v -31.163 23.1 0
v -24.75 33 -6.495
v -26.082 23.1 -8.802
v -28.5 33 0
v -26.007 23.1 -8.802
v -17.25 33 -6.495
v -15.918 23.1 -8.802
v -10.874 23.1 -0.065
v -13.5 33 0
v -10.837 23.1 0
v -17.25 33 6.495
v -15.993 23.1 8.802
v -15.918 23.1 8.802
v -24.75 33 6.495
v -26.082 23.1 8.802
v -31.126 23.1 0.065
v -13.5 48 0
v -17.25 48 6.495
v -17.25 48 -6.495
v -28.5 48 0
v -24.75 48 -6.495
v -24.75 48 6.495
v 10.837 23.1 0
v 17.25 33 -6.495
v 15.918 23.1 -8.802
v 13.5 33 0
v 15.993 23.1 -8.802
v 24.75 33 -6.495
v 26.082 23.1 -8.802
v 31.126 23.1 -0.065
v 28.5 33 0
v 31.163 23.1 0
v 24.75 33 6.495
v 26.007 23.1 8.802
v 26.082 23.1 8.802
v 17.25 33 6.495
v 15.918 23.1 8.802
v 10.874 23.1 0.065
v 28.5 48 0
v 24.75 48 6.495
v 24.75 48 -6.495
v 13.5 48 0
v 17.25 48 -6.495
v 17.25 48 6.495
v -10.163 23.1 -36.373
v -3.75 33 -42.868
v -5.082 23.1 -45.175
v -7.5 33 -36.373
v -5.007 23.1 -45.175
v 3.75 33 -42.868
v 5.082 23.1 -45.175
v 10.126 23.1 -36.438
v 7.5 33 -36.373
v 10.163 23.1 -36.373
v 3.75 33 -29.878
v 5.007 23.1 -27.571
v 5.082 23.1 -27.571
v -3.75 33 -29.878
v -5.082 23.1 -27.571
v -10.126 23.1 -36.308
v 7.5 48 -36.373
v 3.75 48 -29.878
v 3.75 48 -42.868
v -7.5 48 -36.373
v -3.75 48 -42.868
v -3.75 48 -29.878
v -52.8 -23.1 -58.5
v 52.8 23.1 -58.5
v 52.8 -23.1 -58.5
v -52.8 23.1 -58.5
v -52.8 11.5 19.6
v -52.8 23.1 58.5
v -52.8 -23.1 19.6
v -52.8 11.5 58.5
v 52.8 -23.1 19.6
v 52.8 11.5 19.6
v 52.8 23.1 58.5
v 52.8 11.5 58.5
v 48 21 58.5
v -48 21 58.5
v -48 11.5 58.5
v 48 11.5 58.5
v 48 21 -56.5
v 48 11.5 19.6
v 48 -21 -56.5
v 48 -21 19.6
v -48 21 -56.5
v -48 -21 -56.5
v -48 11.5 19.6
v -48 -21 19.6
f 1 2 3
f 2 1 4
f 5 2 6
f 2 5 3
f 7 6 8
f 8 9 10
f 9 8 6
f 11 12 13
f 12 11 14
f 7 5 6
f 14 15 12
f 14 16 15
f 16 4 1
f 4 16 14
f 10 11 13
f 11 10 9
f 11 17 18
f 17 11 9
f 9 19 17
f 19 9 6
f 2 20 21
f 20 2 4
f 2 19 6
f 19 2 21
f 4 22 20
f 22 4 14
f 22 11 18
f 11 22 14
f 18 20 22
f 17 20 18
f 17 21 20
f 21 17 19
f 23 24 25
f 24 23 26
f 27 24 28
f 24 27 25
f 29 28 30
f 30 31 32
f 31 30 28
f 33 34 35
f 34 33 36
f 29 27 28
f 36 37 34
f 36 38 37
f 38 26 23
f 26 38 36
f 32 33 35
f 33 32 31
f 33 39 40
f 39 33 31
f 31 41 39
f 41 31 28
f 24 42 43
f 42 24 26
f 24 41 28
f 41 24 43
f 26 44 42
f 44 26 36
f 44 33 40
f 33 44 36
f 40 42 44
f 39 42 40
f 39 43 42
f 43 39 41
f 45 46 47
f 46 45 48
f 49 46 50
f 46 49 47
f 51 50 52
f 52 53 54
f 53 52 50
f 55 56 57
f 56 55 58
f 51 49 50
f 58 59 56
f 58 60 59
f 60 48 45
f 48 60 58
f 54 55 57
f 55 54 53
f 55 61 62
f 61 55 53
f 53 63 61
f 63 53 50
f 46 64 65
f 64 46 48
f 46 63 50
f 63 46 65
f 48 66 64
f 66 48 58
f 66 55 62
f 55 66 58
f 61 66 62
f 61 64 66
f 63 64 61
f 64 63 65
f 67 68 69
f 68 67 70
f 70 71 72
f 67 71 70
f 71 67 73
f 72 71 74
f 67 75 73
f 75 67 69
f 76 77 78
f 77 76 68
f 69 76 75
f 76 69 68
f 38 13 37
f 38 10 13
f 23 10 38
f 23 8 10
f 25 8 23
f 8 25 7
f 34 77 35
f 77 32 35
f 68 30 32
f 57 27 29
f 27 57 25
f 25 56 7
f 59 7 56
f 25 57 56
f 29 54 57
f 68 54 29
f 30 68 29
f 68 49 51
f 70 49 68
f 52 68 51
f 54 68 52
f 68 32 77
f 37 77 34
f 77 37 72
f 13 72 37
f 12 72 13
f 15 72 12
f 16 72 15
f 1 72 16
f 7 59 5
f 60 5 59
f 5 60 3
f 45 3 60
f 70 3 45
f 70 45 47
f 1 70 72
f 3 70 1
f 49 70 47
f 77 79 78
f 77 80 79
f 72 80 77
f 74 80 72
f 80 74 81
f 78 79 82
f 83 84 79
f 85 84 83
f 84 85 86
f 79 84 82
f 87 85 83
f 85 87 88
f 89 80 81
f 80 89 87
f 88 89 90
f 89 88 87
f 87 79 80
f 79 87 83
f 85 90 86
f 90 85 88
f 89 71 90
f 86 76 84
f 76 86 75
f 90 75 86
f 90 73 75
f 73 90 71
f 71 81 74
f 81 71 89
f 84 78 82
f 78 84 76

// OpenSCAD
// file: common.scad
module insert_empty() {
    translate([-56.25, -123.8, 0]) import("insert-empty.stl");
}

module insert_m4() {
    translate([-138.9, -118.225, 0]) import("insert-m4.stl");
}

module hsw_cell() {
    rotate([0, 0, 360/12]) difference() {
        // outer shell
        cylinder(r=14, h=8, center=true, $fn=6);
        // inner (thick) shell
        cylinder(r=12, h=9, center=true, $fn=6);
        // inner (thin) shell
        translate([0, 0, 2]) cylinder(r=13, h=3, $fn=6);
    }
}

function trapezoid_overhang_size(small_edge_size, height, angle) =  small_edge_size + height*tan(90-angle);

function hex_side_len(radius) = 2*radius*sin(30);

// half of the height of the largest square inscribed in a hexagon: offset from radius to edge (not vertex)
function hex_height(radius) = radius*sin(60);

function hsw_cell_offset(row, col, radius=14, gapx=0, gapy=0) = [
    ((row % 2 == 0) ? 0:hex_height(radius) + gapx/2) + (col * (2*hex_height(radius) + gapx)),
    row*((3/2)*radius + gapy),
    0
];

module hsw_tesselate(rows, cols) {
    for(i = [0:2*rows-1], j = [0:cols-1]) {
        // two radii
        translate(hsw_cell_offset(i, j)) hsw_cell();
    }
}

module rounded_inner(radius=0.25, $fn=25) {
    minkowski() {
        translate([radius, radius, radius]) sphere(r=radius);
        children();
    }
}
// from openscad tips and tricks
module bbox() { 

    // a 3D approx. of the children projection on X axis 
    module xProjection() 
        translate([0,1/2,-1/2]) 
            linear_extrude(1) 
                hull() 
                    projection() 
                        rotate([90,0,0]) 
                            linear_extrude(1) 
                                projection() children(); 
  
    // a bounding box with an offset of 1 in all axis
    module bbx()  
        minkowski() { 
            xProjection() children(); // x axis
            rotate(-90)               // y axis
                xProjection() rotate(90) children(); 
            rotate([0,-90,0])         // z axis
                xProjection() rotate([0,90,0]) children(); 
        } 
    
    // offset children() (a cube) by -1 in all axis
    module shrink()
      intersection() {
        translate([ 1, 1, 1]) children();
        translate([-1,-1,-1]) children();
      }

   shrink() bbx() children(); 
}

module test_tesselate() {
translate([-54.75, -73.2, 0]) import("/home/andy/Downloads/wall-honeycomb-224x190size(mk3s).stl");
radius = 13.5;
gapx = 0.2;
gapy = 0.2;
rows = 10;
cols = 9;
for(i = [0:rows-1], j = [0:cols-1]) {
    translate(hsw_cell_offset(i, j, radius=radius, gapx=gapx, gapy=gapy)) rotate([0, 0, 30]) {text(str(i*rows + j)); color("red") cylinder(r=radius, $fn=6);}
}
}
// main file
use <common.scad>;

di_box_width = 96;
di_box_height = 117;
di_box_depth = 42; // including rubber feet

module dual_mount_box() {
    difference() {
        scale([1.1, 1.1, 1.0]) bbox() children();
        translate([0, 0, 2])  children();
    }
}

$fn = 50;

module di_box_bb() {
    translate([0, -di_box_depth + 30, di_box_height/3 + 0.1]) cube([di_box_width*1.2, di_box_depth+5, di_box_height/3], center=true); 
}

module hex_stub(total_height=25, shank_height=15, fillet_angle=65) {
    fillet_height = total_height-shank_height;
    s = trapezoid_overhang_size(13, fillet_height, fillet_angle)/13;
    translate([0, 0, fillet_height])rotate([180, 0, 0]) linear_extrude(height=fillet_height, scale=s) circle(r=15/2, $fn=6);
    translate([0, 0, fillet_height]) cylinder(r=15/2, h=shank_height, $fn=6);

}
centerpoint = hsw_cell_offset(1, 0);
translate([-centerpoint.y, 23, 0]) rotate([90, 90, 0]) {
    translate(hsw_cell_offset(0, 0)) rotate([180, 0, 360/12]) hex_stub();
    translate(hsw_cell_offset(2, 0)) rotate([180, 0, 360/12]) hex_stub();
    translate(hsw_cell_offset(1, 1)) rotate([180, 0, 360/12]) hex_stub();
}
difference() {
    dual_mount_box() {
        cube([di_box_width, di_box_depth, di_box_height], center=true); 
    }
    di_box_bb();
}
